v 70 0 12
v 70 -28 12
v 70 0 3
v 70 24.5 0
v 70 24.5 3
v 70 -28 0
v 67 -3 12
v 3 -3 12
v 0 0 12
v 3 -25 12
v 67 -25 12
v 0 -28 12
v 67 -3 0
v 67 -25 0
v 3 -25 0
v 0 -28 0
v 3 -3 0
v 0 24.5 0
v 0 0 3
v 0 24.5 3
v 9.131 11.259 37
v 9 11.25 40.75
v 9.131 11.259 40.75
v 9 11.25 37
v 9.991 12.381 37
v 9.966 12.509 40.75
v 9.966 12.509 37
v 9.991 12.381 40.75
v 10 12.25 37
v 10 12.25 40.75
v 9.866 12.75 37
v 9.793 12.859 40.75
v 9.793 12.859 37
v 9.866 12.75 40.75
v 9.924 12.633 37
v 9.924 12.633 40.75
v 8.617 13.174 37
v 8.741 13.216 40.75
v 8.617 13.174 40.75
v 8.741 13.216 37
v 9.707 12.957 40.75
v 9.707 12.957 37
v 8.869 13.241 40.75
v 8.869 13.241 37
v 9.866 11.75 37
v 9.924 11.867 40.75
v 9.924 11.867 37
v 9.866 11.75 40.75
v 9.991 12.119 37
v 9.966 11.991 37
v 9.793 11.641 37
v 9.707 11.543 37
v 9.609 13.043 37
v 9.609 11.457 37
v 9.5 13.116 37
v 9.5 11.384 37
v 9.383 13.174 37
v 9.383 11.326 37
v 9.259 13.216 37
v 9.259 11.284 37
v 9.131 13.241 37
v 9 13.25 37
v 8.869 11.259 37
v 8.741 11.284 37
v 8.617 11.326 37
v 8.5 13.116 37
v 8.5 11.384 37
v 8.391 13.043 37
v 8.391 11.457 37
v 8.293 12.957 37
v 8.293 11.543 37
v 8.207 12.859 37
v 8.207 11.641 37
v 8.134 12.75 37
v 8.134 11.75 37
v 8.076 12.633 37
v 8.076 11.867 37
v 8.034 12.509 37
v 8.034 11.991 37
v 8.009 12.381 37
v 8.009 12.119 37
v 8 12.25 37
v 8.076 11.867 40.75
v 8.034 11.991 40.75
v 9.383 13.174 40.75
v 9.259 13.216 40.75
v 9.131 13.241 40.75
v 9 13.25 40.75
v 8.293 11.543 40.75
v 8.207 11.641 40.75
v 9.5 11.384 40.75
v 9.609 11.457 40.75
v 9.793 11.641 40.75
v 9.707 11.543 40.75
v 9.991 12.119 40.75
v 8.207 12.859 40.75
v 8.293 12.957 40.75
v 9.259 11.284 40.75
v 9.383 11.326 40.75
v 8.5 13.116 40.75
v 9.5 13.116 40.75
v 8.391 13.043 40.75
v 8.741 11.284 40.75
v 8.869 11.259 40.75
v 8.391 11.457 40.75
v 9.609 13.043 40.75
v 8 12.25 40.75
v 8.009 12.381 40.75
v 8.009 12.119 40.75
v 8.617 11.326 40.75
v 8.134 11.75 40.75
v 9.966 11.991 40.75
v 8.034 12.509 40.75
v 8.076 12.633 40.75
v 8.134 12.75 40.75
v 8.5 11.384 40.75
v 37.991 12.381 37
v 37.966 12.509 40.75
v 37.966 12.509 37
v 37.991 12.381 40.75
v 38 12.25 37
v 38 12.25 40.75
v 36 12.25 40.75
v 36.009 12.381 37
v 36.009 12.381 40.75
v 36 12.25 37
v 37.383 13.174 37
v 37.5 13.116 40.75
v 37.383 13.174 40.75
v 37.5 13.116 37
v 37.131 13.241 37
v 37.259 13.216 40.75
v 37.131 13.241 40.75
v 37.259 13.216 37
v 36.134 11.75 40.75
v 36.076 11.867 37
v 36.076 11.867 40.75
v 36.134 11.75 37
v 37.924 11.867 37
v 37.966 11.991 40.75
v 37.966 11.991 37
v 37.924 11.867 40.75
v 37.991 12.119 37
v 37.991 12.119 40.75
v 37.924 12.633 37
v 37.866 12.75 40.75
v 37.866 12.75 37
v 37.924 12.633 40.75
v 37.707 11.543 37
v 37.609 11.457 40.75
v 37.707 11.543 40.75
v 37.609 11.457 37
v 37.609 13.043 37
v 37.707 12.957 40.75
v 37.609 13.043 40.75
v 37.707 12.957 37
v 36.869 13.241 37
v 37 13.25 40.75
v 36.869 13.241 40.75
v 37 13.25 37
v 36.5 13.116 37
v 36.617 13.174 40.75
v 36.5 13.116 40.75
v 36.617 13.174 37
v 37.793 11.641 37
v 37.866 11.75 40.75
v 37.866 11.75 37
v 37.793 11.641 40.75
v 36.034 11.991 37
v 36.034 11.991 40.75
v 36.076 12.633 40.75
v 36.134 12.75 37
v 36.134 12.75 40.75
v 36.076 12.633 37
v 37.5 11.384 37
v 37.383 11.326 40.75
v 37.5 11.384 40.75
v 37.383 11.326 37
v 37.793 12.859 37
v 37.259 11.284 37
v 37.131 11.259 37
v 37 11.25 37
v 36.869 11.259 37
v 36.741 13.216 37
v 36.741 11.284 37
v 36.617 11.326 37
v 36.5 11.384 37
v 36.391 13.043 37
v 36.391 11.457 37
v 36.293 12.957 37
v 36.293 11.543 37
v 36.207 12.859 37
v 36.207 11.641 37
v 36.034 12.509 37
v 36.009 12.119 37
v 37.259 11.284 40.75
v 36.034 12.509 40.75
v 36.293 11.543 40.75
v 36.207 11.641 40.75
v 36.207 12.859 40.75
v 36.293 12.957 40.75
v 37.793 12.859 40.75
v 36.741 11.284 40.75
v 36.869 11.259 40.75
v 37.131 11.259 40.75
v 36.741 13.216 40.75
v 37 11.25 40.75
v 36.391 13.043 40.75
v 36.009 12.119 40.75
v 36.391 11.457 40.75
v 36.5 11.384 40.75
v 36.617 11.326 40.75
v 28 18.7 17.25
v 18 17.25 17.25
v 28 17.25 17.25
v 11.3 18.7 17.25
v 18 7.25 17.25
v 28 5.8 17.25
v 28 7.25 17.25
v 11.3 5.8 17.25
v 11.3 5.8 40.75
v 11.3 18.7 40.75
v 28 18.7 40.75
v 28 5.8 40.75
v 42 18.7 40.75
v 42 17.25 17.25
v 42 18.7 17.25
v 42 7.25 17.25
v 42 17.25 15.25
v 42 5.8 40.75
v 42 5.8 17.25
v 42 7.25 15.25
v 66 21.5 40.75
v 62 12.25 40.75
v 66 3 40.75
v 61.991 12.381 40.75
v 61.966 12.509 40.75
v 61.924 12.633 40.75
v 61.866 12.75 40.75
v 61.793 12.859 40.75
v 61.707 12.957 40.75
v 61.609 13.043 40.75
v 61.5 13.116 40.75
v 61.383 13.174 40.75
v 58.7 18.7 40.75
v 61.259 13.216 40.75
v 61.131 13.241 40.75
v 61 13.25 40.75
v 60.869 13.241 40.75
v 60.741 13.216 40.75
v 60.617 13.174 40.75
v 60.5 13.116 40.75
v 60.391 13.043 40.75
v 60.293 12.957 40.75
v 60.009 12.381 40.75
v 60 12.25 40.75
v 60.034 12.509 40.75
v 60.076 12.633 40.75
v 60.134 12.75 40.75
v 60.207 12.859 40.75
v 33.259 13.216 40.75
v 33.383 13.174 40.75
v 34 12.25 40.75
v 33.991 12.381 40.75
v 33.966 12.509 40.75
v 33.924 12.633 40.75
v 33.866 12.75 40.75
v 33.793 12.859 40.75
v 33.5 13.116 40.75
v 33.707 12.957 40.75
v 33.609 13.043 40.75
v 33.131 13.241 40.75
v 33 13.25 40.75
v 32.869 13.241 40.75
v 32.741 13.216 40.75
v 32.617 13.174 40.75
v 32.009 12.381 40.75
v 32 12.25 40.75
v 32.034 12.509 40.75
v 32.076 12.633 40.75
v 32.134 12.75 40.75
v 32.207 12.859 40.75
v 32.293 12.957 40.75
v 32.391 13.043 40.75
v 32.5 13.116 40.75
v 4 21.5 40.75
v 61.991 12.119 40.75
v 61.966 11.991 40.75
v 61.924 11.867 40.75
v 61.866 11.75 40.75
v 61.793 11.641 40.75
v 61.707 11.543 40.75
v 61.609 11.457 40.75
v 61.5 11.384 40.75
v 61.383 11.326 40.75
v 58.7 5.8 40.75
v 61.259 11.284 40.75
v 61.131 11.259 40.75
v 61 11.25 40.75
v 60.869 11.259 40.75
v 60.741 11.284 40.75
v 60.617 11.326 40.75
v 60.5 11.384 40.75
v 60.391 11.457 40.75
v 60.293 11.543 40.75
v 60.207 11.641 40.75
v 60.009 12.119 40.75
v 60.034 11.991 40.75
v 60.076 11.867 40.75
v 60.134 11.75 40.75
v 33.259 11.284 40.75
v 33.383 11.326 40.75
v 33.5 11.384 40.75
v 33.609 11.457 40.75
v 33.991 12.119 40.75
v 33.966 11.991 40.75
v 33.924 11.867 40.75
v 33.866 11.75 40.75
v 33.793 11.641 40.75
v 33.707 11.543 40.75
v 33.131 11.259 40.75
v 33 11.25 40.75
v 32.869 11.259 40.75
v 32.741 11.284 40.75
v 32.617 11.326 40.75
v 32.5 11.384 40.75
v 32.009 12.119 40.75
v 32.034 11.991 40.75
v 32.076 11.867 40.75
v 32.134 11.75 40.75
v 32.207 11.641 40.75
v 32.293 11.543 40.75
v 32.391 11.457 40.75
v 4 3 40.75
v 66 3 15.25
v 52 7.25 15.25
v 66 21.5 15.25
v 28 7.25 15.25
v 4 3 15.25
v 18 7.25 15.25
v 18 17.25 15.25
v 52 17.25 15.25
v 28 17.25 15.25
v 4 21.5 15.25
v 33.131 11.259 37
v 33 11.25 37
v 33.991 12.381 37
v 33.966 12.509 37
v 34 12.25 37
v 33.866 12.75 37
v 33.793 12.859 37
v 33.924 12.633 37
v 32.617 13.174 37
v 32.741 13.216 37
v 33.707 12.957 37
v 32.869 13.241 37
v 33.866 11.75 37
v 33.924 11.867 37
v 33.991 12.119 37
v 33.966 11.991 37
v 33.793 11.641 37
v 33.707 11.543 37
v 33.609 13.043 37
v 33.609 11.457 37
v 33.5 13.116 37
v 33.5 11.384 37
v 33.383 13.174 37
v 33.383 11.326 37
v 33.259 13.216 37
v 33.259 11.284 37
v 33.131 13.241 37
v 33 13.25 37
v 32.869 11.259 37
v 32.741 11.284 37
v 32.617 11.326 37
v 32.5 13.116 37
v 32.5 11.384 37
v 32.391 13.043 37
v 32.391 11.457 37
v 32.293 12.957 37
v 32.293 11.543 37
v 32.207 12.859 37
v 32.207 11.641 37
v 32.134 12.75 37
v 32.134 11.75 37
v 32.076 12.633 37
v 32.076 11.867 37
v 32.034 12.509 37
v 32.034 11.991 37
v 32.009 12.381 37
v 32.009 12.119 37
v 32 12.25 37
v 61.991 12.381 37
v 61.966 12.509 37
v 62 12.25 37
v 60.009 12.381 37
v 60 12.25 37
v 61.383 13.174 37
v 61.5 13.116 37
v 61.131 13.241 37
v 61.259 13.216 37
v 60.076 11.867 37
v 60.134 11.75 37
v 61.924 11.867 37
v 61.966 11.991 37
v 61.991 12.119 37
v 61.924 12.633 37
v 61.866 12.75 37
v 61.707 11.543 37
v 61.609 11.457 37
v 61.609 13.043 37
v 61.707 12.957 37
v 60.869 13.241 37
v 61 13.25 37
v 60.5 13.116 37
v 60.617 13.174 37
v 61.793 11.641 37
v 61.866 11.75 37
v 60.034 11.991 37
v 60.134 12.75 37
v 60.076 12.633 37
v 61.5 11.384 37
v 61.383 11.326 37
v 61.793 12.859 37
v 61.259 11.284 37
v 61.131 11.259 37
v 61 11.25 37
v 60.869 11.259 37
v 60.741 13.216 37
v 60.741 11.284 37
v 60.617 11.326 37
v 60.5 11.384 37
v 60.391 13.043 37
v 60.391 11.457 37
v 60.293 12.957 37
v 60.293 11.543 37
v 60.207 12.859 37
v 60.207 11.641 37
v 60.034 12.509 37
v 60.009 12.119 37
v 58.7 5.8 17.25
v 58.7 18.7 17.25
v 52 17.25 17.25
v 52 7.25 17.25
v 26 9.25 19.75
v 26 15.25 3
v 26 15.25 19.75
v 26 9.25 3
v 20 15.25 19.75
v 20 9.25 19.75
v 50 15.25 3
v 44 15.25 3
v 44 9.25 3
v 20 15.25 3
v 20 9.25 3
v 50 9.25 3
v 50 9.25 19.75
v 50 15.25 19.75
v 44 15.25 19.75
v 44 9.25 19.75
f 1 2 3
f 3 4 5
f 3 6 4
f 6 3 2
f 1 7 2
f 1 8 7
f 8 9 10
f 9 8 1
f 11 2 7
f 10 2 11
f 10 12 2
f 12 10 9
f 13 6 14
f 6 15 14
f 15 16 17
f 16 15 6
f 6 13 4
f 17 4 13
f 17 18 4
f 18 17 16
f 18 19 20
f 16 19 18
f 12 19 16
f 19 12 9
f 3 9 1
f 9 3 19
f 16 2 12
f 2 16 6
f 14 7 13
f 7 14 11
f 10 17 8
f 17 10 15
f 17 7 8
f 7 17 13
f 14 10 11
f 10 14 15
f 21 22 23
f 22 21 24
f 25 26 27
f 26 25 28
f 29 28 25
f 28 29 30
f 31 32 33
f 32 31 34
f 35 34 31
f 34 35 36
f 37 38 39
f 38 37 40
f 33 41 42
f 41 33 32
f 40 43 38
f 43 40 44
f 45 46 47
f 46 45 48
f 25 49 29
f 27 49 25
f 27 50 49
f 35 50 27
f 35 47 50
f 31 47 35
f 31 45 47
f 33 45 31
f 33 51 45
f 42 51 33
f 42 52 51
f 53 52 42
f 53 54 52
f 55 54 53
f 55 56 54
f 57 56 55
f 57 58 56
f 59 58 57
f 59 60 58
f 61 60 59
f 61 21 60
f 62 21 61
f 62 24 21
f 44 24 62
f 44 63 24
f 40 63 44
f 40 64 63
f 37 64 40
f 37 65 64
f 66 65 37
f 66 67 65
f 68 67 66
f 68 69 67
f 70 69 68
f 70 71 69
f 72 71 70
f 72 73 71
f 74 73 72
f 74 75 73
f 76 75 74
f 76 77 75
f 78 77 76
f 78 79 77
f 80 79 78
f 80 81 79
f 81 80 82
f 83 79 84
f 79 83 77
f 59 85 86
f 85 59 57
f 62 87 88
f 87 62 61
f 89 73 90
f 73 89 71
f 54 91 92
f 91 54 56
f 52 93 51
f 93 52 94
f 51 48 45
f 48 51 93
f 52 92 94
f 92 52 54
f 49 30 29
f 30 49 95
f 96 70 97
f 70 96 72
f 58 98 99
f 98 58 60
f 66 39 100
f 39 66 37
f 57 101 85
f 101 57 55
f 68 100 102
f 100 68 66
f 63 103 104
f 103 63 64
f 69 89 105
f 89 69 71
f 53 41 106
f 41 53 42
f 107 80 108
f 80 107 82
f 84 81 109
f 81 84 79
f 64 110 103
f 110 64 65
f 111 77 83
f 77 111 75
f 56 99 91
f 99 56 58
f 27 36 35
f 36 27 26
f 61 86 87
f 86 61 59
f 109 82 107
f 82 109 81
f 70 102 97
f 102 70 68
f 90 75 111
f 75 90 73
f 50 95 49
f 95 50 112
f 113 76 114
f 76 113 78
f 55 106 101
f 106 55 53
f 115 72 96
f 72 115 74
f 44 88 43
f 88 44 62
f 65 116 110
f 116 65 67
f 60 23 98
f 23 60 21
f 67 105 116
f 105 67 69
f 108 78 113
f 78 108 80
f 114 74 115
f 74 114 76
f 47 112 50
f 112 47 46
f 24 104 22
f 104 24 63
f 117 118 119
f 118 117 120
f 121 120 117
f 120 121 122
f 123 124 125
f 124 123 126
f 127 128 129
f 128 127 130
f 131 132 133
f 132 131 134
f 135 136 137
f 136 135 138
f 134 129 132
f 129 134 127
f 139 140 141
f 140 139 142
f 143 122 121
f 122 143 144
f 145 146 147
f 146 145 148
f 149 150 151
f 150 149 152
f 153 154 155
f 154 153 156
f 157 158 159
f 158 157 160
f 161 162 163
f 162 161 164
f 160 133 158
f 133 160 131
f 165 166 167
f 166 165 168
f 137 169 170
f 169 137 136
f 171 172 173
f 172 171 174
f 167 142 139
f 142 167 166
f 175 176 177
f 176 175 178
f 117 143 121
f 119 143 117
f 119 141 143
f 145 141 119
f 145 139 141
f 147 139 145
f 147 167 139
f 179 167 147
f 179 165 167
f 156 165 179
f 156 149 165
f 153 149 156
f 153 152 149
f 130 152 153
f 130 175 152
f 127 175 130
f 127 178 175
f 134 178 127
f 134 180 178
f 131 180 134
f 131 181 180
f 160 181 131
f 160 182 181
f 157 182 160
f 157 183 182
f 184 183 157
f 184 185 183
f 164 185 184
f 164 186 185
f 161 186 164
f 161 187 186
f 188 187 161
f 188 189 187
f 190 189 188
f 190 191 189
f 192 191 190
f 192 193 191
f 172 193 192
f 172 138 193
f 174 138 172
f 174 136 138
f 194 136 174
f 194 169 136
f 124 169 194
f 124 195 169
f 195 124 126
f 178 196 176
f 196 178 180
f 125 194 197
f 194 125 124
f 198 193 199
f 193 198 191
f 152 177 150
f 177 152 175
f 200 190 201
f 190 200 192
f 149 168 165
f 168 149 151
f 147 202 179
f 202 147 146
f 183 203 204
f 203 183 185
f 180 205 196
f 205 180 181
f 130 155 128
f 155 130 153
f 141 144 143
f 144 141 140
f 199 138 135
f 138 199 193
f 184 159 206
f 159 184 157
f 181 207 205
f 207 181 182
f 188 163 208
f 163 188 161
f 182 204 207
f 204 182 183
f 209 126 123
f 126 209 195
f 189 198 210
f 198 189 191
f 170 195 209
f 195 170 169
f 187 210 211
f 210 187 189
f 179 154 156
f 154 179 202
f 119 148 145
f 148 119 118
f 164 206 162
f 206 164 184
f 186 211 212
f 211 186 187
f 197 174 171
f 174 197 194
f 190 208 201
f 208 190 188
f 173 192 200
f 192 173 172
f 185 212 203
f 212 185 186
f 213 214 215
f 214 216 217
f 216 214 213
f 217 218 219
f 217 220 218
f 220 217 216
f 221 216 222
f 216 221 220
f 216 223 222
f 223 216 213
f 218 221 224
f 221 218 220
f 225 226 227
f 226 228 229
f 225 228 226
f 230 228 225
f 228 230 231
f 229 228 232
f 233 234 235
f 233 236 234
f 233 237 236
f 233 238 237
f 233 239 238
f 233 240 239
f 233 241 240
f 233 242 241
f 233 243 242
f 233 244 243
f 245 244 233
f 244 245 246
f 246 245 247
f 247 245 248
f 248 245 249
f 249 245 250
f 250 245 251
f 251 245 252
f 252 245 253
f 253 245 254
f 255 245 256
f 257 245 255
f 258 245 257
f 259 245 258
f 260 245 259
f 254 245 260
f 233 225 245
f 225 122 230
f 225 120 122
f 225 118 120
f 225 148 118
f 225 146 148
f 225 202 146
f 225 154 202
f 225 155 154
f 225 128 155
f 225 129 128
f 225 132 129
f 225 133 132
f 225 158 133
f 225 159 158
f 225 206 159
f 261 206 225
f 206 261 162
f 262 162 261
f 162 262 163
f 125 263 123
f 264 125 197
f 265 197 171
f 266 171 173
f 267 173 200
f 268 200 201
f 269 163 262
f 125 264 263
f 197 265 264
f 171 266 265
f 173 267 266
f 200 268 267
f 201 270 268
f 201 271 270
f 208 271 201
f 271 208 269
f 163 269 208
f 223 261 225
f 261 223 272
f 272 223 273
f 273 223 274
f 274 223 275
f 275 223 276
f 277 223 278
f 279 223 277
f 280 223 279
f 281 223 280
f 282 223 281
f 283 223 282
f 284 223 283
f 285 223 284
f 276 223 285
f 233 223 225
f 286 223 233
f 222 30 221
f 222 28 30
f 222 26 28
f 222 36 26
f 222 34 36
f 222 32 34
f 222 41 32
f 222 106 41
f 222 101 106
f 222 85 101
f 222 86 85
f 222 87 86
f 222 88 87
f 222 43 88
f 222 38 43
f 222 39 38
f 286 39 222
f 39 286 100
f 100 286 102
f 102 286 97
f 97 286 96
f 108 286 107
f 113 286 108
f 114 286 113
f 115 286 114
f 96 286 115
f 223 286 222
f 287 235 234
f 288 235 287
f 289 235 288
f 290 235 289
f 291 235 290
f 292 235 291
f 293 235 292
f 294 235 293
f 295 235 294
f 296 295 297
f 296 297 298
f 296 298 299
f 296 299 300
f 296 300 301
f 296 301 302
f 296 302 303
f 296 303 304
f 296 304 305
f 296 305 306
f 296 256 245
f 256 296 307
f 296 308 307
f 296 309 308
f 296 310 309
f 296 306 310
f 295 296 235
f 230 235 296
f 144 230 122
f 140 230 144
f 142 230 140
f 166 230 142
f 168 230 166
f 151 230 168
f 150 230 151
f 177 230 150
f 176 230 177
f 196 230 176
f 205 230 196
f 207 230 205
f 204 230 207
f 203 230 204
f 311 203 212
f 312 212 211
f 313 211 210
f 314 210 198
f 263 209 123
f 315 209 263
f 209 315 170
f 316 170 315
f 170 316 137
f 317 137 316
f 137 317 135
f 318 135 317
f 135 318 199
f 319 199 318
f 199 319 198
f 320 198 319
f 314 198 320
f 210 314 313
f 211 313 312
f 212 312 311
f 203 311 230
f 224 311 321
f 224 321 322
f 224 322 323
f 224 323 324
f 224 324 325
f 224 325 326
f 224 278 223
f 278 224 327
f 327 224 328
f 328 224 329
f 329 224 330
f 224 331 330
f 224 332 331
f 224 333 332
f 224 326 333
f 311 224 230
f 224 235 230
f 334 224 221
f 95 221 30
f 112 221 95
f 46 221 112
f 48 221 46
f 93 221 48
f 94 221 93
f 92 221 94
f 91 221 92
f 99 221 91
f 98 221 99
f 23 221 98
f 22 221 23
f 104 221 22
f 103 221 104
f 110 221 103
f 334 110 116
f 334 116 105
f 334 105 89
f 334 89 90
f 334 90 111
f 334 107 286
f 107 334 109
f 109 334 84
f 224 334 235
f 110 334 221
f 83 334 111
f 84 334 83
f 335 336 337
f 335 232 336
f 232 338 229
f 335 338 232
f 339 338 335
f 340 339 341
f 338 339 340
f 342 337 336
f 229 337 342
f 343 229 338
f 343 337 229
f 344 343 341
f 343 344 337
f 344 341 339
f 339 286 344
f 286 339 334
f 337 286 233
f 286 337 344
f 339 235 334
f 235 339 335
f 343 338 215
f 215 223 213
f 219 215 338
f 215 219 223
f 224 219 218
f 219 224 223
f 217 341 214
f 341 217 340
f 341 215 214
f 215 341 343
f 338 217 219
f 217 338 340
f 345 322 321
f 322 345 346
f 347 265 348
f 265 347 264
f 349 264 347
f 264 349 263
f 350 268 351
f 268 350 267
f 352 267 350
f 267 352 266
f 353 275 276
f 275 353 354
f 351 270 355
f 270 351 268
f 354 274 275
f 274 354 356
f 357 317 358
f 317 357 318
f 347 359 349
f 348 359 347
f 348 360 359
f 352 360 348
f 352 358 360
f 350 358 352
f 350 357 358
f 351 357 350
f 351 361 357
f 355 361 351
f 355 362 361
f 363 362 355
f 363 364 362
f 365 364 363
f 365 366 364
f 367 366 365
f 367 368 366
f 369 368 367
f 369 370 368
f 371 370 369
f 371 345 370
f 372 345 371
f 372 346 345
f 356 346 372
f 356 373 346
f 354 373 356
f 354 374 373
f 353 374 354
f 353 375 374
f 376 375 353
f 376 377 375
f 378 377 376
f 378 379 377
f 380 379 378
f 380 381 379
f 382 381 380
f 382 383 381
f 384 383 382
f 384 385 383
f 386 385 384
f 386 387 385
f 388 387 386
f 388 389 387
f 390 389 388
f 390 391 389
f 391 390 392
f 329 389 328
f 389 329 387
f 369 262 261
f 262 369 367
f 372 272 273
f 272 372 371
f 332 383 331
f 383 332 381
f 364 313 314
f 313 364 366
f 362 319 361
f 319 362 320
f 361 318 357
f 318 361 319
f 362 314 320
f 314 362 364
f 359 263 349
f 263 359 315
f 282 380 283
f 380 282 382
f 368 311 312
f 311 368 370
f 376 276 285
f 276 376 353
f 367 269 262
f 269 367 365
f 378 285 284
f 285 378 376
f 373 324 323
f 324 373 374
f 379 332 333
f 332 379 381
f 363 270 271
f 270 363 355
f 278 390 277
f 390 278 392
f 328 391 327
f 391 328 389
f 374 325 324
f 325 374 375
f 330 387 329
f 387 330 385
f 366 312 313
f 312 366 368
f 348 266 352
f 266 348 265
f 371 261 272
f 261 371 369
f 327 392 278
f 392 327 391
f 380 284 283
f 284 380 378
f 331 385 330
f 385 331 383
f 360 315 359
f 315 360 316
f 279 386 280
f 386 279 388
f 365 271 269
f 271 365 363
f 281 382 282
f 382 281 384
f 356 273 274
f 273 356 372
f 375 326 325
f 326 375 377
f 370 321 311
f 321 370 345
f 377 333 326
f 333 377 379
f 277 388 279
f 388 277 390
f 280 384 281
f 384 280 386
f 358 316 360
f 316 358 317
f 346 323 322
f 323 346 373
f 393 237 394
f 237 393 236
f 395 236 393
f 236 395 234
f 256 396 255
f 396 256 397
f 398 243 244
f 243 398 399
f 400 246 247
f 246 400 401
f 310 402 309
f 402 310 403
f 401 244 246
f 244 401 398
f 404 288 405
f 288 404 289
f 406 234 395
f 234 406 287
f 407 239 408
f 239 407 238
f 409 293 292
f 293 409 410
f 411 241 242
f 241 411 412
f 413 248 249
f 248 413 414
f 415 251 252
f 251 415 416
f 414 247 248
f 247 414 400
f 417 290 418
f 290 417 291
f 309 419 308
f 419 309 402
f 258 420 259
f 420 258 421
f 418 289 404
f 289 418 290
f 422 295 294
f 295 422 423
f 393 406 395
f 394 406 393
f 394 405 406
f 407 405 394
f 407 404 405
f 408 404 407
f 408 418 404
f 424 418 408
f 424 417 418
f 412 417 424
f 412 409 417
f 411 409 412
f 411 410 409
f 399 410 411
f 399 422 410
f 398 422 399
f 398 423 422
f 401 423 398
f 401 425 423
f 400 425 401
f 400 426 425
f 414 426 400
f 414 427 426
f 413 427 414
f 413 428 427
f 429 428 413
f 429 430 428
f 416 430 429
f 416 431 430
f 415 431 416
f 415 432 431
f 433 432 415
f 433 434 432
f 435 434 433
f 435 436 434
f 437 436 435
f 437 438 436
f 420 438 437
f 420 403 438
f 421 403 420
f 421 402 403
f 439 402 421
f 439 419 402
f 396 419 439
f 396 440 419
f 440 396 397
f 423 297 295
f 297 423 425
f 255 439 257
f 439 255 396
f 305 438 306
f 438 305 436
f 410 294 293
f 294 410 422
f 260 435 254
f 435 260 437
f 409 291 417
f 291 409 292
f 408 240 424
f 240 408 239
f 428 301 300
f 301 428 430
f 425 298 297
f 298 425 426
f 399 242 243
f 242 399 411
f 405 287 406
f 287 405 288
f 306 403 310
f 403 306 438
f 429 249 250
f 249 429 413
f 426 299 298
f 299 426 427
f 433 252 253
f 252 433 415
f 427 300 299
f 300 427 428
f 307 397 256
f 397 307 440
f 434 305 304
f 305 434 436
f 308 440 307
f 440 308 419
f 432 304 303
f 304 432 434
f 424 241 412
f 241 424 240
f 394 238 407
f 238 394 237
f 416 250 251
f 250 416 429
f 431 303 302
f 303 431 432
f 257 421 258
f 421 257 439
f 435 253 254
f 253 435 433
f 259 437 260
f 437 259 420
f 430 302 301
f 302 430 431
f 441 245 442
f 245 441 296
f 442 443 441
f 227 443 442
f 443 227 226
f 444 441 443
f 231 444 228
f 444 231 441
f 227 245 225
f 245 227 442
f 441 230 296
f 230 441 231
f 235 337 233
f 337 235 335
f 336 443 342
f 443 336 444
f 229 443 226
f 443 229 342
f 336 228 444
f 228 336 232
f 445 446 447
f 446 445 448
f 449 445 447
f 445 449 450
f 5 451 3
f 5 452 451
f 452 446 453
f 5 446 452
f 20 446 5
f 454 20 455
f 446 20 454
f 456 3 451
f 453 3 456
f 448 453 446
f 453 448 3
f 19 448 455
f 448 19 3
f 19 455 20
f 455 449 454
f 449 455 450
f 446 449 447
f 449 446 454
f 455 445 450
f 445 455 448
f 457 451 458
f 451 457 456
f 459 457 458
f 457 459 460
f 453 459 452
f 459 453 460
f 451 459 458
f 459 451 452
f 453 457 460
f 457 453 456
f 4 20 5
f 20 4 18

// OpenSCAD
// =====================================================================
// ThirdThumb Rig — parametric servo clamp (Tier 3)
// A printable bracket that grips a controller edge and holds two SG90
// micro-servos so their horns tap the A and B face buttons.
//
// Render an STL:   openscad -o clamp.stl clamp.scad
// Tune the numbers below to your controller, then re-export. KISS:
// everything that varies between controllers lives in PARAMETERS.
// Units: millimetres. Print: PLA/PETG, 0.2mm layers, 3 perimeters, 20% infill.
// =====================================================================

/* [PARAMETERS] */
// --- controller fit ---
shell_thickness = 22;     // how thick the controller is where the clamp grips
lip_grip        = 9;      // how far the jaw wraps over the front/back faces
button_spacing  = 24;     // centre-to-centre distance between A and B buttons
reach           = 28;     // how far the servos sit above the clamp base

// --- build quality ---
wall            = 3;      // structural wall thickness
base_w          = 70;     // width of the base plate
clearance       = 0.4;    // printer fit clearance for the servo pocket

// --- SG90 micro-servo (typical) ---
sg90_body  = [23.0, 12.5, 22.5];   // L x W x H of the body pocket
sg90_tab_l = 32.0;                 // length across the mounting tabs
sg90_tab_t = 2.5;                  // tab thickness
sg90_hole_spacing = 28.0;          // screw-hole centres
sg90_hole_d = 2.0;

$fn = 48;

// ---------------------------------------------------------------------
module servo_pocket() {
    // hollow body pocket + the tab ledge the servo flange rests on
    union() {
        cube([sg90_body[0]+clearance, sg90_body[1]+clearance, sg90_body[2]+2], center=true);
        // mounting screw holes through the tab ledge
        for (s=[-1,1])
            translate([s*sg90_hole_spacing/2, 0, sg90_body[2]/2])
                cylinder(h=sg90_tab_t*3, d=sg90_hole_d, center=true);
    }
}

module servo_mount() {
    // a block with the body pocket subtracted, open at the bottom for the horn
    difference() {
        cube([sg90_tab_l+2*wall, sg90_body[1]+2*wall, sg90_body[2]+wall], center=true);
        translate([0,0,wall/2]) servo_pocket();
        // window for the horn / output shaft to reach down to the button
        translate([0,0,-sg90_body[2]/2-wall]) cube([10,10,wall*3], center=true);
    }
}

module clamp_jaw() {
    // C-shaped jaw that hooks over the controller's top edge
    difference() {
        cube([base_w, shell_thickness+2*wall, lip_grip+wall]);
        translate([wall, wall, -1])
            cube([base_w-2*wall, shell_thickness, lip_grip+wall+2]);
    }
}

module base_plate() {
    cube([base_w, sg90_body[1]+2*wall+6, wall]);
}

// ---------------------------------------------------------------------
// ASSEMBLY
module rig() {
    // base
    base_plate();
    // jaw under the base, gripping the controller
    translate([0, -(shell_thickness+2*wall), 0]) clamp_jaw();
    // two servo mounts raised above the base, centred over A and B
    for (s=[-1,1])
        translate([base_w/2 + s*button_spacing/2,
                   (sg90_body[1]+2*wall+6)/2,
                   reach])
            servo_mount();
    // support posts from base to each mount
    for (s=[-1,1])
        translate([base_w/2 + s*button_spacing/2 - wall,
                   (sg90_body[1]+2*wall+6)/2 - wall, wall])
            cube([2*wall, 2*wall, reach - sg90_body[2]/2]);
}

rig();
